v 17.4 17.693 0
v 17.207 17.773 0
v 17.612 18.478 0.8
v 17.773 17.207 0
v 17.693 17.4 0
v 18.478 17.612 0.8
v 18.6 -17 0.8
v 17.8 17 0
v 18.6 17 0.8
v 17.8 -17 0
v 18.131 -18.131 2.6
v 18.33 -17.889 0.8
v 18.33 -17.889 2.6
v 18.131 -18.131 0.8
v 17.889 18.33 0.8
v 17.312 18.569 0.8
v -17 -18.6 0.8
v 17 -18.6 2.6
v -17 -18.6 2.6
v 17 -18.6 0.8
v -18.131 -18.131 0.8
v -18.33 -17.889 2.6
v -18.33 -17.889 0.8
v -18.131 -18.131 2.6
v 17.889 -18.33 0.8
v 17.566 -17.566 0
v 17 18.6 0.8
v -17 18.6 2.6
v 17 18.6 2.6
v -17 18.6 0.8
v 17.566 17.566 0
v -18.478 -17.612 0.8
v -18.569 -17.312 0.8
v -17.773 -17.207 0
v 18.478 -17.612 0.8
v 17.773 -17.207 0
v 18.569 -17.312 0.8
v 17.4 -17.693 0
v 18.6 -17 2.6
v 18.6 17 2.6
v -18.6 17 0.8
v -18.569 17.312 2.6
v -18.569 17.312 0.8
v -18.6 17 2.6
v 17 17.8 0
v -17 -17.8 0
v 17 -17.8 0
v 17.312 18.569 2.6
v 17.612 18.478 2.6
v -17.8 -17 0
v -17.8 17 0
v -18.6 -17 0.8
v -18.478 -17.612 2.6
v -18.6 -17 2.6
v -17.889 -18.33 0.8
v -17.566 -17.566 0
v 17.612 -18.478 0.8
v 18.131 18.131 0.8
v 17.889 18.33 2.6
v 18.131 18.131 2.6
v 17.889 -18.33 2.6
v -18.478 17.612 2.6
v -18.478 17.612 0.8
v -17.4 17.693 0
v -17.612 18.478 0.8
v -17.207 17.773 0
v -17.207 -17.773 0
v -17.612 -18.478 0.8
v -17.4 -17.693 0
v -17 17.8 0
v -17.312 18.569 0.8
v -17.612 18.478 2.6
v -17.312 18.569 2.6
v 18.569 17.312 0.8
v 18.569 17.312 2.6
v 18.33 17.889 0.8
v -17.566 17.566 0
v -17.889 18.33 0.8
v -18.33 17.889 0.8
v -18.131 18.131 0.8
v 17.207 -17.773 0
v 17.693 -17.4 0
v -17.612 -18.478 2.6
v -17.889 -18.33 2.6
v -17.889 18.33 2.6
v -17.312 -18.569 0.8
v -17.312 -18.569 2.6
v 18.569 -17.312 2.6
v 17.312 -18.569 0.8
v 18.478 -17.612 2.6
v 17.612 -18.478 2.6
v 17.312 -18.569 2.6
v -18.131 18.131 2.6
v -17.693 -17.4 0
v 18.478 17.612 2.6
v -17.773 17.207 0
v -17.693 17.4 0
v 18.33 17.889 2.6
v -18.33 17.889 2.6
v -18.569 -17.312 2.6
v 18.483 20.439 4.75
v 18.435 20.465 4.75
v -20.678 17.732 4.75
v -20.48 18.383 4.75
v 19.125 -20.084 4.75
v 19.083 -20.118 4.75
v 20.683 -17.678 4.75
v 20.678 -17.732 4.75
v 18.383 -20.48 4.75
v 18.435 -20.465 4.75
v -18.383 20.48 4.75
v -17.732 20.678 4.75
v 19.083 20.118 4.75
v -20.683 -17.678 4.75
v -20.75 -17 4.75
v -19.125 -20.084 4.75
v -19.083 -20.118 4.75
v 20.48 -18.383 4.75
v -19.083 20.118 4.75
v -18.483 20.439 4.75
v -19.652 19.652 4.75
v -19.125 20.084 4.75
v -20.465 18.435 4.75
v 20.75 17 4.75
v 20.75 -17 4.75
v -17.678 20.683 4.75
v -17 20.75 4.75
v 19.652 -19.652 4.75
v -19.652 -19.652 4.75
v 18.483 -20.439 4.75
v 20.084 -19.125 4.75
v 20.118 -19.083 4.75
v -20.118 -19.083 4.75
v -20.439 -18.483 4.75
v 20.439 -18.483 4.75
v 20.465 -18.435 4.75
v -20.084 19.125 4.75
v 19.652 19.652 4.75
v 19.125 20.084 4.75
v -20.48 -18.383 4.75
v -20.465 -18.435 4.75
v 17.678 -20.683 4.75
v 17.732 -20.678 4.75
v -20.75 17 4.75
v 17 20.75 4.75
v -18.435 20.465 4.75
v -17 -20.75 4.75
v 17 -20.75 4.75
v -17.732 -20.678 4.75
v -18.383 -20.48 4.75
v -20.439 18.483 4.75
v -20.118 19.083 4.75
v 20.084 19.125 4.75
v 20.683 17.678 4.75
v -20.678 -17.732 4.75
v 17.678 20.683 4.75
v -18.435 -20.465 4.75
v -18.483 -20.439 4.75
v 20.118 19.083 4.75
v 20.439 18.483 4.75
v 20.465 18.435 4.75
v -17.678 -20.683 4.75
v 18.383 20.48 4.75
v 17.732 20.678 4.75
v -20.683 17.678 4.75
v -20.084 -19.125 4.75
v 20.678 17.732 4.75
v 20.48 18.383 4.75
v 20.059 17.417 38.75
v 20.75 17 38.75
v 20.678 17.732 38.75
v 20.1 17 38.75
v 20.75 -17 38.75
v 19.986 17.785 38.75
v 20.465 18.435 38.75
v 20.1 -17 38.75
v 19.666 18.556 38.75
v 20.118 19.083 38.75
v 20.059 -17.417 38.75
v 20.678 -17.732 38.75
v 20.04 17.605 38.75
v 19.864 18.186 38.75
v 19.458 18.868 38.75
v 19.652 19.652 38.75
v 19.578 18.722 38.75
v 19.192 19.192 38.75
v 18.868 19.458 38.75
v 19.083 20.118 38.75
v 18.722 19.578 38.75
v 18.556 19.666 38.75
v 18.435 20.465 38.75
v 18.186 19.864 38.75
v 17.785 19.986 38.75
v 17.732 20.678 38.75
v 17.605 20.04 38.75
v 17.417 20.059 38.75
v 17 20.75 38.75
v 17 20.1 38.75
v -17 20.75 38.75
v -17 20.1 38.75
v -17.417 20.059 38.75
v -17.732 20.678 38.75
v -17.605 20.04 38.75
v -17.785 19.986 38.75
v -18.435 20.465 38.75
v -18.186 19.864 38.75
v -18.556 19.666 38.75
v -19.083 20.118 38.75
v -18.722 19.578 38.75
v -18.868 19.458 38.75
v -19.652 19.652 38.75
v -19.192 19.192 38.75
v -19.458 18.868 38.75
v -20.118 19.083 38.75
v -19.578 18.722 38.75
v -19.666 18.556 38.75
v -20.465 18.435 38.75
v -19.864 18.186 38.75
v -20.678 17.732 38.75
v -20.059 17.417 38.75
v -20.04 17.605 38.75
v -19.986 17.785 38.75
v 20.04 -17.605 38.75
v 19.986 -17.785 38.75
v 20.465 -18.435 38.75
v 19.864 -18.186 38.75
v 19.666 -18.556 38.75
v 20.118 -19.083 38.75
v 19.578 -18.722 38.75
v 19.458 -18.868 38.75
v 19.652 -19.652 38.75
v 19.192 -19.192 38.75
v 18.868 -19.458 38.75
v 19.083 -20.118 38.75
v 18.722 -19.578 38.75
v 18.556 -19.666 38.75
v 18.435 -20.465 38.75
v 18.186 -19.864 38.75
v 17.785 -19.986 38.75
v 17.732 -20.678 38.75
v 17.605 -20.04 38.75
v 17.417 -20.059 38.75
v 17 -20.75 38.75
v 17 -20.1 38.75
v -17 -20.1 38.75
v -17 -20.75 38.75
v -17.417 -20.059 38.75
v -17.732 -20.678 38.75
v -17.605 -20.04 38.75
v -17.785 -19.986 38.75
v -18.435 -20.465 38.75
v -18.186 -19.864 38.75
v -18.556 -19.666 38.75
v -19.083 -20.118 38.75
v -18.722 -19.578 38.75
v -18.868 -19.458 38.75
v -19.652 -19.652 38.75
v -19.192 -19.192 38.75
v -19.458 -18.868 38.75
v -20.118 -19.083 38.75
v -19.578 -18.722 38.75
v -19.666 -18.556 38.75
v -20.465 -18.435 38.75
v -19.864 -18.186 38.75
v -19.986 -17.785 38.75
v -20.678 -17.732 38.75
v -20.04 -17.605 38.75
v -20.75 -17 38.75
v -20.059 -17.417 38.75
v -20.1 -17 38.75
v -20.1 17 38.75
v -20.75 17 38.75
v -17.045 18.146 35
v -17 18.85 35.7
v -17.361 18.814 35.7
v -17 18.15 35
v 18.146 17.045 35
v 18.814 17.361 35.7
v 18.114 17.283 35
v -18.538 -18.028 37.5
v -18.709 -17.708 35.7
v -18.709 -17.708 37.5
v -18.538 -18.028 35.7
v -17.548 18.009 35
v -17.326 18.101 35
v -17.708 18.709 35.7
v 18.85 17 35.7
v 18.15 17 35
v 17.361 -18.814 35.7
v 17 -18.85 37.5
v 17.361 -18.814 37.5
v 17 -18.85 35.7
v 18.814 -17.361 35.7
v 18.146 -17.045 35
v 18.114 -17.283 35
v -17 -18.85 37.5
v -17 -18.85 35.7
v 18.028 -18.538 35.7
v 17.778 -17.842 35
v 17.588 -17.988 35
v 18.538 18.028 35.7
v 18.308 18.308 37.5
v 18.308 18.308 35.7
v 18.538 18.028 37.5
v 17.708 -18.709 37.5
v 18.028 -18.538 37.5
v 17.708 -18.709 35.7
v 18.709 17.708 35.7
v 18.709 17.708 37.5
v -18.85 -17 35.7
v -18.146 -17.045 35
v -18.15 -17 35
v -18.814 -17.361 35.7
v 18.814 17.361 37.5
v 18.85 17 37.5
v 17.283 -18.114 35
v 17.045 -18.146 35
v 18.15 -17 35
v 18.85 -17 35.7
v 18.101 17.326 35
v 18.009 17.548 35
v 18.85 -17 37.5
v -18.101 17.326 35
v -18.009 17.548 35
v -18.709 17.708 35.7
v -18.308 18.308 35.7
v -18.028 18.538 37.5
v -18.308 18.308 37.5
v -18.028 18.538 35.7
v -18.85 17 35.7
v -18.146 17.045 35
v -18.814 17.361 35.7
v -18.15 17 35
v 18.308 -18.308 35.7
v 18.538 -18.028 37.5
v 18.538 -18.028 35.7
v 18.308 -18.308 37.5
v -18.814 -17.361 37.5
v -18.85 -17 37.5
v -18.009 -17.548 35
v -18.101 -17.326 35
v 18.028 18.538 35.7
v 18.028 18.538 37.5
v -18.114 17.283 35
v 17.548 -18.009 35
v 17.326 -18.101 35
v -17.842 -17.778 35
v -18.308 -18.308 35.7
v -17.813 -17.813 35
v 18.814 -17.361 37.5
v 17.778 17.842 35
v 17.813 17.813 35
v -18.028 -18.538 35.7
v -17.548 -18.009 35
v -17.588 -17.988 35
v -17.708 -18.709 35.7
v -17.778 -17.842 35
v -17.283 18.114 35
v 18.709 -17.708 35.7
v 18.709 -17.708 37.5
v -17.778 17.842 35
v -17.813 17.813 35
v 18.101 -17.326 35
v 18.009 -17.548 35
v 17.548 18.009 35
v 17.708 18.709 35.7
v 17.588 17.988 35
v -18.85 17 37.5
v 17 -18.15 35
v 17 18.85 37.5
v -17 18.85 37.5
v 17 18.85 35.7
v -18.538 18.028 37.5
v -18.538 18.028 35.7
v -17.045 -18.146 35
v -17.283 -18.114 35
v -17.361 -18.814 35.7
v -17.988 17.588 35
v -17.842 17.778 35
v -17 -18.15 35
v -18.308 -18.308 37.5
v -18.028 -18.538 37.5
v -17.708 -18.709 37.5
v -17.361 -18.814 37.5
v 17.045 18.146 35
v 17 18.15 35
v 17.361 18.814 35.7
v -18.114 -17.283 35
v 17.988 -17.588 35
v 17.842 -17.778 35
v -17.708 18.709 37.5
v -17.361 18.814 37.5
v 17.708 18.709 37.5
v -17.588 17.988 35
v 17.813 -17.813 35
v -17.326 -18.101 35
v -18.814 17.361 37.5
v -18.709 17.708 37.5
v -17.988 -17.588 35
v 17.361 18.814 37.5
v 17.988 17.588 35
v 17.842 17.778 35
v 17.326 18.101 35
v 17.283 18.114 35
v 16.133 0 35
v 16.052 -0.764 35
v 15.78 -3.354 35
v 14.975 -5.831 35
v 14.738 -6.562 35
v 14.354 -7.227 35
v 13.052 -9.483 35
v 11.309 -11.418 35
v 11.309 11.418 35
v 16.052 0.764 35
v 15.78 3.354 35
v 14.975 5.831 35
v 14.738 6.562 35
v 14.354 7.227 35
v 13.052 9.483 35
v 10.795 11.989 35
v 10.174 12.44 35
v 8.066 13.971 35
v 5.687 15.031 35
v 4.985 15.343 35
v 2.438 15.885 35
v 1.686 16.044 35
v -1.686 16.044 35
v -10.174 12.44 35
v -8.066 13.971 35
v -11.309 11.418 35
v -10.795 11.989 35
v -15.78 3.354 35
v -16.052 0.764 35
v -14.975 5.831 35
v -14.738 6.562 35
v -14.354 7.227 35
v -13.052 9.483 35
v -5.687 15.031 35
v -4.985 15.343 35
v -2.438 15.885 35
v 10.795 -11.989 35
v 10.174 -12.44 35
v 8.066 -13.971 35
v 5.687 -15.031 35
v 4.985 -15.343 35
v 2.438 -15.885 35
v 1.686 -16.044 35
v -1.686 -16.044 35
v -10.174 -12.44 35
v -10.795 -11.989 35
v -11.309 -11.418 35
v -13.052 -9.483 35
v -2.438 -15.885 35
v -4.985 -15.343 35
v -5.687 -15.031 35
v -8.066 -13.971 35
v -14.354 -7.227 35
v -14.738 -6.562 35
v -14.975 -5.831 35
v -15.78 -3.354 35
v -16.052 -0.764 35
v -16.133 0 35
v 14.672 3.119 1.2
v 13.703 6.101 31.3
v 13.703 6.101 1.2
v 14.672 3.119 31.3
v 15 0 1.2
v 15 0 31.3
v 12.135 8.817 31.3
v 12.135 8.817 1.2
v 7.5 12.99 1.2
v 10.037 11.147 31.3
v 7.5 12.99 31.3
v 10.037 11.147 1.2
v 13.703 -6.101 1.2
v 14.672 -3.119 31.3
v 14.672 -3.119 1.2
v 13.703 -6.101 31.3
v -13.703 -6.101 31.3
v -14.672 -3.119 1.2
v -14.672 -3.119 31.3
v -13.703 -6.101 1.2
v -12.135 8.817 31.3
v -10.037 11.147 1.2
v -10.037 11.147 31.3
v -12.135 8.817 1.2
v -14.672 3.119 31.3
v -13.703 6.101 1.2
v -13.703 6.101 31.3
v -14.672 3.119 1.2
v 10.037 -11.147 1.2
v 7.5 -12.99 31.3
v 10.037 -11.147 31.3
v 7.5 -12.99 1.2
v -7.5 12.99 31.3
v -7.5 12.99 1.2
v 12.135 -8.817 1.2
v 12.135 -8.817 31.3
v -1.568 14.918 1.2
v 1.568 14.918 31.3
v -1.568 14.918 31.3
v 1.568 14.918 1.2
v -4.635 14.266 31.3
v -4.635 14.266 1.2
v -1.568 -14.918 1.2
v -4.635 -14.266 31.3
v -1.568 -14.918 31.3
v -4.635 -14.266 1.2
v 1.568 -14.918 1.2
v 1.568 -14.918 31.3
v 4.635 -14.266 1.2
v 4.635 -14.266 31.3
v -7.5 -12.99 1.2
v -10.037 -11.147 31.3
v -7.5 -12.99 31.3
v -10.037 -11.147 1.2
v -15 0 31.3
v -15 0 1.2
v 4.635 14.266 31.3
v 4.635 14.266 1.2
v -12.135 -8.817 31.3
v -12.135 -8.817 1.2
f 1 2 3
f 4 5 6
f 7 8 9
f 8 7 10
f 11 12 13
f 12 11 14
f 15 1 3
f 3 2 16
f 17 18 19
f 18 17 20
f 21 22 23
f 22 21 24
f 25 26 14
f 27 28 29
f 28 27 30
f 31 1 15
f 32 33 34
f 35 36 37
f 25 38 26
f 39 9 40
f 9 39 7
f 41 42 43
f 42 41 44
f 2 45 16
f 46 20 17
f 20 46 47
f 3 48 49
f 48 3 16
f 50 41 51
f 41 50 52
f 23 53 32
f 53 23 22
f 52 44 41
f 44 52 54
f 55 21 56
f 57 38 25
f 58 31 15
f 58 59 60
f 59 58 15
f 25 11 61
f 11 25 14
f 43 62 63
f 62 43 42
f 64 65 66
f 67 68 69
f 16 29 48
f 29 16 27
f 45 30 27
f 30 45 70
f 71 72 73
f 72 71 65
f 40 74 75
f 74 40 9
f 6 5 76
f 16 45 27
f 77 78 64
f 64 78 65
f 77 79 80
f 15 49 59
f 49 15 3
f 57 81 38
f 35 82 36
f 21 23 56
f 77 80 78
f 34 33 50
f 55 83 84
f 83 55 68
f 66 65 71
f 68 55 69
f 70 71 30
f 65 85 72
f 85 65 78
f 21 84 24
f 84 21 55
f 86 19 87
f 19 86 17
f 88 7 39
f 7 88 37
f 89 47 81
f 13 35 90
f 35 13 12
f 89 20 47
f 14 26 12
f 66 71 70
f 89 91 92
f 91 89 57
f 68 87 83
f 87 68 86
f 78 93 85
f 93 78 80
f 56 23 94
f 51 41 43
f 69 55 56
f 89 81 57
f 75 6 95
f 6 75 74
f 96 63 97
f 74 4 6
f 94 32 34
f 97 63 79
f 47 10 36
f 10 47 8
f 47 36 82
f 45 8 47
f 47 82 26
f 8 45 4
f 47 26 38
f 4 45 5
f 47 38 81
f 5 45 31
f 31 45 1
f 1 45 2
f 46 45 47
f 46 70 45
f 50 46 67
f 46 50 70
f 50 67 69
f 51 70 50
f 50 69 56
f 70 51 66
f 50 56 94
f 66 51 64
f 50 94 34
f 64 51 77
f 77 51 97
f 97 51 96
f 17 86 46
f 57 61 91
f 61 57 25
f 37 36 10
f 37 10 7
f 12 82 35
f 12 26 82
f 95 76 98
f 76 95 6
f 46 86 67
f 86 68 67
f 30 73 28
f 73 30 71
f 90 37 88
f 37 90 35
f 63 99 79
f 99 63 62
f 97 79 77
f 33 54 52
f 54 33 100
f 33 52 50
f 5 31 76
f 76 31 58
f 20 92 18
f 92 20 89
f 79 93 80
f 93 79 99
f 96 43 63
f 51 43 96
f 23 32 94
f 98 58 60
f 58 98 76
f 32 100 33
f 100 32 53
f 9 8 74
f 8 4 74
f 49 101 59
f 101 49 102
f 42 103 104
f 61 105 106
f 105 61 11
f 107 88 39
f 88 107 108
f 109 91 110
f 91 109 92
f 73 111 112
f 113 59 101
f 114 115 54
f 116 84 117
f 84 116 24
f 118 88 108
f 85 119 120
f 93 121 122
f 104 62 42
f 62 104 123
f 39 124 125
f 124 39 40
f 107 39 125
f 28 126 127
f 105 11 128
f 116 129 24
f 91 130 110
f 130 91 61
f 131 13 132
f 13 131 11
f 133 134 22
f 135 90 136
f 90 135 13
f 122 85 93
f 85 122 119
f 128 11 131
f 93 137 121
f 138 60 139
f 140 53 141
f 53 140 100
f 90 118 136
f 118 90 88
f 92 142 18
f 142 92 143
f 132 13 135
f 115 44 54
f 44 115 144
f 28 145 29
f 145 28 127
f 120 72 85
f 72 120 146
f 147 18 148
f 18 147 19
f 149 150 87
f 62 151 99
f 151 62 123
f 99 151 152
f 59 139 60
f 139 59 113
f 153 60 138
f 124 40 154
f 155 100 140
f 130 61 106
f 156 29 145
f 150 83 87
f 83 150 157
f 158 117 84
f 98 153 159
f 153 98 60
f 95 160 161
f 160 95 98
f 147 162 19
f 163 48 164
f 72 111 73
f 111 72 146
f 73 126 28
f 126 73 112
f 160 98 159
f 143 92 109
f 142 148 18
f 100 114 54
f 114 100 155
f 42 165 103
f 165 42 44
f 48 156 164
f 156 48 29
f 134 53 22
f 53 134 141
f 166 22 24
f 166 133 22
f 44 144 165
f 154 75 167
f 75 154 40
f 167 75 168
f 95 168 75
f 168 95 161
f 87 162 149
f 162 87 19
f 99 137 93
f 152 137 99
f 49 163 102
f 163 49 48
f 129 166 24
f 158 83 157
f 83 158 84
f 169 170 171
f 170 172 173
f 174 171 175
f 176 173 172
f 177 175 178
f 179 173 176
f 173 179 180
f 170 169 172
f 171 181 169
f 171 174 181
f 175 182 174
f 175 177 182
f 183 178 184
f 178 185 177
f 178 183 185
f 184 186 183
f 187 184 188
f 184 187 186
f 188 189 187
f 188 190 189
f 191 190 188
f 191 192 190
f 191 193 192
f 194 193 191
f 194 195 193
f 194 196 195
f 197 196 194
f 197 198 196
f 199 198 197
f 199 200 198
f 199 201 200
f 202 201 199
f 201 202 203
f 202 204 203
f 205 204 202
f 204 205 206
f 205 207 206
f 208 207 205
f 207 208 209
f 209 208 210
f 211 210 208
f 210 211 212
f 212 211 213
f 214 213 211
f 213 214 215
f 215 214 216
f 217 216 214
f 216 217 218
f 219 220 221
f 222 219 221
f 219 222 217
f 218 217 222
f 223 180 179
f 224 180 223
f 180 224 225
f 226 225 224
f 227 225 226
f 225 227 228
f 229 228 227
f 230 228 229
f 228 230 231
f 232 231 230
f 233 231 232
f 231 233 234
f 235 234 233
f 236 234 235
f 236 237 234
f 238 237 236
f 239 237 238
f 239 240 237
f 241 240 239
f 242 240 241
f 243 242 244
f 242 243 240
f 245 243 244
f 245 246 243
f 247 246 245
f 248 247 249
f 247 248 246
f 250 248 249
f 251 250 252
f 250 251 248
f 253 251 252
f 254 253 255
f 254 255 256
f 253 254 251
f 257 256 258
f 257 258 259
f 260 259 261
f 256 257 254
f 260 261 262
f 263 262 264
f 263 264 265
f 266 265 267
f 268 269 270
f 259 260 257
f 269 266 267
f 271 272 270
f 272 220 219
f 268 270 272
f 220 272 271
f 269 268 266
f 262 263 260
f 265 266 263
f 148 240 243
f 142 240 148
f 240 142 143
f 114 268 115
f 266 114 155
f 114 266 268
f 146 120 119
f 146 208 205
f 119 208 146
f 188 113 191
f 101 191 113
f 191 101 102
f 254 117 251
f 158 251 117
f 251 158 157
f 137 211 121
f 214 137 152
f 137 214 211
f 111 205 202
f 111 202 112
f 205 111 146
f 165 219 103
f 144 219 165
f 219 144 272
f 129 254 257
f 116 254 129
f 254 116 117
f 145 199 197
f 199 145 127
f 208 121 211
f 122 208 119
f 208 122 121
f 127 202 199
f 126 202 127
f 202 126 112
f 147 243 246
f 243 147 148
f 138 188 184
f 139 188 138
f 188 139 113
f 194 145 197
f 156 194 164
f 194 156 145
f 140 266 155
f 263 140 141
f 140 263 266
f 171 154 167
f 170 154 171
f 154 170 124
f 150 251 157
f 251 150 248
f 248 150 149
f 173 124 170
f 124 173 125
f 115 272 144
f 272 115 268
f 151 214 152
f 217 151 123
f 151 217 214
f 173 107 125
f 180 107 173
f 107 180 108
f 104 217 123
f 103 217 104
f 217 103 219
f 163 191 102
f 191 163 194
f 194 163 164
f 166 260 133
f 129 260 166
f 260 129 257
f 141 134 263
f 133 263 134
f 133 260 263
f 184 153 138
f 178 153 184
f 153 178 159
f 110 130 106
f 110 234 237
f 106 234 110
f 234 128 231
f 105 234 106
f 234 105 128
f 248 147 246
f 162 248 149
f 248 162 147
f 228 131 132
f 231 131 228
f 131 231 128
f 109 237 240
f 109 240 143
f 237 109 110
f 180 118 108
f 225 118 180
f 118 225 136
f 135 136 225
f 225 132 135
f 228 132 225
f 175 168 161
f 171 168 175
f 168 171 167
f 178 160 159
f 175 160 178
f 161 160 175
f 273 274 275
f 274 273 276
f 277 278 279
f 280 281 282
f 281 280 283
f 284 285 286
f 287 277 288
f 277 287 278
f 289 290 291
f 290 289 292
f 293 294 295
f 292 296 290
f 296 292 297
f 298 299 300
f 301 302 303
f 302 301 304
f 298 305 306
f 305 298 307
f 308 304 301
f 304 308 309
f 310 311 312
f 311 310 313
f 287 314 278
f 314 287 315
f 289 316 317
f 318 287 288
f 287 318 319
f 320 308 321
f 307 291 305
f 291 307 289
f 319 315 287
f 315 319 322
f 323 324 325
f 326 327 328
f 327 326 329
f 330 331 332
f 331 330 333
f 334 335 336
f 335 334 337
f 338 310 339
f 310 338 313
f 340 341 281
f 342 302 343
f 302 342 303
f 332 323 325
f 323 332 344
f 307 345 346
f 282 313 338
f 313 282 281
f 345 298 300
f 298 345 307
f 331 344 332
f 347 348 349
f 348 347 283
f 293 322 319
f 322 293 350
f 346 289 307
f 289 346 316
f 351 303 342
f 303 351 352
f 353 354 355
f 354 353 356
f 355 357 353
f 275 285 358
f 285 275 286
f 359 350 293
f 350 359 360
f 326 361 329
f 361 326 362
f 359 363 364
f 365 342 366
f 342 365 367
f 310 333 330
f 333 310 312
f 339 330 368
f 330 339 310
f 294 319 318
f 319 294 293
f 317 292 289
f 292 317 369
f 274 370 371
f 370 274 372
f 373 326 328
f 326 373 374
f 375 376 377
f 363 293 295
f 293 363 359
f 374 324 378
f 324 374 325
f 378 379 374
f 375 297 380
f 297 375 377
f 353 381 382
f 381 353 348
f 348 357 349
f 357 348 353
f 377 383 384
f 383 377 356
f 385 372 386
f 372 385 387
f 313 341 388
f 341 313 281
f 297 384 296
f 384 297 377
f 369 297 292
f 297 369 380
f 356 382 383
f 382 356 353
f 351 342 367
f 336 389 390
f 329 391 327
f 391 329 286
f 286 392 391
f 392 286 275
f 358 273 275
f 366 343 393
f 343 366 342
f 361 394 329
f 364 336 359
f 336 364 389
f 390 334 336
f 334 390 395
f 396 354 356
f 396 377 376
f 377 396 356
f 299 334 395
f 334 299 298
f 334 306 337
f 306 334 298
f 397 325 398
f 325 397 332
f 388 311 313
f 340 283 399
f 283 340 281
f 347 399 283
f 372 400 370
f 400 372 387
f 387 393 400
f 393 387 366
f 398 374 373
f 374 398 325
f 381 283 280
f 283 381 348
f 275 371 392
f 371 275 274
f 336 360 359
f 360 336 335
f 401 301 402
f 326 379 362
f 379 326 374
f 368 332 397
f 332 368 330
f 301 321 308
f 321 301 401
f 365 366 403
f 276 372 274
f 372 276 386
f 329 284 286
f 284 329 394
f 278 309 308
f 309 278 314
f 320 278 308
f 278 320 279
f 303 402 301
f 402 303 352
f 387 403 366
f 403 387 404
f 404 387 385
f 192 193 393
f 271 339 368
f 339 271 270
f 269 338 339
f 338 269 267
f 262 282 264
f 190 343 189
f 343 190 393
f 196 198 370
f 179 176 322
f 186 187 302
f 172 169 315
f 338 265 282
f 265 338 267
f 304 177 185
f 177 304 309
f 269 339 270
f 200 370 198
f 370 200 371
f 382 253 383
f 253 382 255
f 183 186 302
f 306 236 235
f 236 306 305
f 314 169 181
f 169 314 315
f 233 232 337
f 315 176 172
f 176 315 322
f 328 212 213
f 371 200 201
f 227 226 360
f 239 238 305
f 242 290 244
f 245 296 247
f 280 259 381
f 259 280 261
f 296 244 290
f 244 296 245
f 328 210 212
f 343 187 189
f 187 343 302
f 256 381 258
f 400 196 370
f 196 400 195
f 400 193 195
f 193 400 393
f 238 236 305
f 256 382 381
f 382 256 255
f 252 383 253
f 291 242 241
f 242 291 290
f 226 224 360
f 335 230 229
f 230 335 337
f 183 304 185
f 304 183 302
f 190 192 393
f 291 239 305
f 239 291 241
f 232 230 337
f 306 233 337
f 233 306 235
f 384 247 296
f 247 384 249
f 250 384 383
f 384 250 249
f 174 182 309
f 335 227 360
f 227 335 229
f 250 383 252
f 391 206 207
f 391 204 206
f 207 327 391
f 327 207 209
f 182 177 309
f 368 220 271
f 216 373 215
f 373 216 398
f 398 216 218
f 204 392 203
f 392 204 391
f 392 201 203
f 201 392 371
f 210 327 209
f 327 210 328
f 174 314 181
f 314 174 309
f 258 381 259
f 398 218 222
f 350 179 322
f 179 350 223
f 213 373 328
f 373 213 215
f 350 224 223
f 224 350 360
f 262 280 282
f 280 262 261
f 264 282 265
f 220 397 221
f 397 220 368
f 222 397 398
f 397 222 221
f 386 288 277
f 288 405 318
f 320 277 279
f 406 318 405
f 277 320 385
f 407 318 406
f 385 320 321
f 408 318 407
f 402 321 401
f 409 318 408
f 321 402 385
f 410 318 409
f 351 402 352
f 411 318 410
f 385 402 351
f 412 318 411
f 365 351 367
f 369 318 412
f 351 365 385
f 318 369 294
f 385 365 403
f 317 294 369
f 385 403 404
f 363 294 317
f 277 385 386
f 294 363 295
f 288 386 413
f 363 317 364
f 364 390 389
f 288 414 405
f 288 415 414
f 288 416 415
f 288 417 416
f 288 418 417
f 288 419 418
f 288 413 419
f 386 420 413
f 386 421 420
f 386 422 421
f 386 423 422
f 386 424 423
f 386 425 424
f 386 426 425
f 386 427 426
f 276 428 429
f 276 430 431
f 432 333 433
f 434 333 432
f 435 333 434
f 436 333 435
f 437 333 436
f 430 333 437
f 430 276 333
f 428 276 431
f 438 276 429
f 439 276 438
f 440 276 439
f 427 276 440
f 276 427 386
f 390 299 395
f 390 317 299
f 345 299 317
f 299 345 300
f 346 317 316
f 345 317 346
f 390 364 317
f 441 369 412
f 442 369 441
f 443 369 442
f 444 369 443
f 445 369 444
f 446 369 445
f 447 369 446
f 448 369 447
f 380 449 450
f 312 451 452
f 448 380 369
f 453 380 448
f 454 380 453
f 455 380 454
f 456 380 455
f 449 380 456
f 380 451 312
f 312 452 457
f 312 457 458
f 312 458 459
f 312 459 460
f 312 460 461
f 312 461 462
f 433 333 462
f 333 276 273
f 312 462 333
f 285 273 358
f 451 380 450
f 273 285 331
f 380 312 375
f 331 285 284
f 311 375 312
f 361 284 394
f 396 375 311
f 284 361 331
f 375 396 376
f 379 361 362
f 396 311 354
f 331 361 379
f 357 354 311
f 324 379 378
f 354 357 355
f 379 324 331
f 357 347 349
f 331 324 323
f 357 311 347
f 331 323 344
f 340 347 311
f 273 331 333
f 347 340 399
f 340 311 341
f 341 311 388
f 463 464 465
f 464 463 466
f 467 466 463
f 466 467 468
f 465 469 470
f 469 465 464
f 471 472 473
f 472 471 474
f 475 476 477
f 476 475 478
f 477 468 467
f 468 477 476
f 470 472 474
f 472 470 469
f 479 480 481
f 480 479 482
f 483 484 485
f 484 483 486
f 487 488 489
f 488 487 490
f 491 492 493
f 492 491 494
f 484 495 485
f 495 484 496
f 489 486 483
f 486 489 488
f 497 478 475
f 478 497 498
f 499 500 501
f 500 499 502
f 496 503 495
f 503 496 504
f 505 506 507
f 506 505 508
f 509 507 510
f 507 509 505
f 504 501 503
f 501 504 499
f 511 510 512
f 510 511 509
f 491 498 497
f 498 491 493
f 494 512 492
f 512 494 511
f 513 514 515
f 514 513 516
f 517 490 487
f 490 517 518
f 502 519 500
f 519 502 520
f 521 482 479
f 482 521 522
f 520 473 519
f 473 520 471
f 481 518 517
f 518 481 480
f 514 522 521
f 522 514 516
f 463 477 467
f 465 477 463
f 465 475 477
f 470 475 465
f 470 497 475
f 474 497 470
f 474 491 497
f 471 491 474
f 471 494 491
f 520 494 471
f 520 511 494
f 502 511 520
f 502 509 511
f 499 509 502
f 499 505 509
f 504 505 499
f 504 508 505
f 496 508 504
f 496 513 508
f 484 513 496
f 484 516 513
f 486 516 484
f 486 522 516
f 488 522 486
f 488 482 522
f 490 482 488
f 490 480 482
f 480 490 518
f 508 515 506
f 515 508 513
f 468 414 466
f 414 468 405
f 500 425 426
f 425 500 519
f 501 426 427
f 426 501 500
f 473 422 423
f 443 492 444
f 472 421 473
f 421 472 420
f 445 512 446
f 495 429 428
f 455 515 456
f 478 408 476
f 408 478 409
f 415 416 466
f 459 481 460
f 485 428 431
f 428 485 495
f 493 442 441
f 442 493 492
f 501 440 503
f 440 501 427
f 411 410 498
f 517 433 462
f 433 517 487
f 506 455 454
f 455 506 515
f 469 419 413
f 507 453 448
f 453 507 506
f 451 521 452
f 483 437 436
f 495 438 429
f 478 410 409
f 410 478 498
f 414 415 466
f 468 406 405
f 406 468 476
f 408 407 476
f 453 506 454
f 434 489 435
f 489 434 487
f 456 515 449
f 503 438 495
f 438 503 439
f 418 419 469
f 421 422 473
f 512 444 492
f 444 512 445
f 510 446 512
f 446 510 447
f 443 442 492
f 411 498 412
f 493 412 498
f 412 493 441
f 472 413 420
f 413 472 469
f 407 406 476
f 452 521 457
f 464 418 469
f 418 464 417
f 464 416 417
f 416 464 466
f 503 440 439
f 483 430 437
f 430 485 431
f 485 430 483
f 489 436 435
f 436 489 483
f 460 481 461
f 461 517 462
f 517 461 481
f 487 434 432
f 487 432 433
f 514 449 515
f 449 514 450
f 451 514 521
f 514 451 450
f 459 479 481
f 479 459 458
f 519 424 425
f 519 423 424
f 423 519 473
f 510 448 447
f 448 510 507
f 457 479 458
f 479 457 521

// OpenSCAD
include <gridfinity_modules.scad>

cup_height = 5;
stick_diameter = 30;
easement_z = 0.7; // a slightly large opening at the top for compliance while inserting.
minimum_wall = 4;
blocks_needed = ceil((stick_diameter+2*minimum_wall)/gridfinity_pitch);

render()
glue_stick_cup(blocks_needed, blocks_needed, cup_height);


module glue_stick_cup(num_x=1, num_y=1, num_z=2) {
  difference() {
    grid_block(num_x, num_y, num_z, magnet_diameter=0, screw_depth=0, center=true);
    glue_stick(num_z, stick_diameter);
  }
}

module glue_stick(num_z=5, diam) {
  floor_thickness = blocks_needed > 1 ? 5.5 : 1.2;
  translate([0, 0, floor_thickness]) cylinder(h=num_z*gridfinity_zpitch, d=diam);
  translate([0, 0, (num_z - easement_z)*gridfinity_zpitch + 1.2]) 
    cylinder(h=easement_z*gridfinity_zpitch, d1=diam, d2=diam*1.1);
}
